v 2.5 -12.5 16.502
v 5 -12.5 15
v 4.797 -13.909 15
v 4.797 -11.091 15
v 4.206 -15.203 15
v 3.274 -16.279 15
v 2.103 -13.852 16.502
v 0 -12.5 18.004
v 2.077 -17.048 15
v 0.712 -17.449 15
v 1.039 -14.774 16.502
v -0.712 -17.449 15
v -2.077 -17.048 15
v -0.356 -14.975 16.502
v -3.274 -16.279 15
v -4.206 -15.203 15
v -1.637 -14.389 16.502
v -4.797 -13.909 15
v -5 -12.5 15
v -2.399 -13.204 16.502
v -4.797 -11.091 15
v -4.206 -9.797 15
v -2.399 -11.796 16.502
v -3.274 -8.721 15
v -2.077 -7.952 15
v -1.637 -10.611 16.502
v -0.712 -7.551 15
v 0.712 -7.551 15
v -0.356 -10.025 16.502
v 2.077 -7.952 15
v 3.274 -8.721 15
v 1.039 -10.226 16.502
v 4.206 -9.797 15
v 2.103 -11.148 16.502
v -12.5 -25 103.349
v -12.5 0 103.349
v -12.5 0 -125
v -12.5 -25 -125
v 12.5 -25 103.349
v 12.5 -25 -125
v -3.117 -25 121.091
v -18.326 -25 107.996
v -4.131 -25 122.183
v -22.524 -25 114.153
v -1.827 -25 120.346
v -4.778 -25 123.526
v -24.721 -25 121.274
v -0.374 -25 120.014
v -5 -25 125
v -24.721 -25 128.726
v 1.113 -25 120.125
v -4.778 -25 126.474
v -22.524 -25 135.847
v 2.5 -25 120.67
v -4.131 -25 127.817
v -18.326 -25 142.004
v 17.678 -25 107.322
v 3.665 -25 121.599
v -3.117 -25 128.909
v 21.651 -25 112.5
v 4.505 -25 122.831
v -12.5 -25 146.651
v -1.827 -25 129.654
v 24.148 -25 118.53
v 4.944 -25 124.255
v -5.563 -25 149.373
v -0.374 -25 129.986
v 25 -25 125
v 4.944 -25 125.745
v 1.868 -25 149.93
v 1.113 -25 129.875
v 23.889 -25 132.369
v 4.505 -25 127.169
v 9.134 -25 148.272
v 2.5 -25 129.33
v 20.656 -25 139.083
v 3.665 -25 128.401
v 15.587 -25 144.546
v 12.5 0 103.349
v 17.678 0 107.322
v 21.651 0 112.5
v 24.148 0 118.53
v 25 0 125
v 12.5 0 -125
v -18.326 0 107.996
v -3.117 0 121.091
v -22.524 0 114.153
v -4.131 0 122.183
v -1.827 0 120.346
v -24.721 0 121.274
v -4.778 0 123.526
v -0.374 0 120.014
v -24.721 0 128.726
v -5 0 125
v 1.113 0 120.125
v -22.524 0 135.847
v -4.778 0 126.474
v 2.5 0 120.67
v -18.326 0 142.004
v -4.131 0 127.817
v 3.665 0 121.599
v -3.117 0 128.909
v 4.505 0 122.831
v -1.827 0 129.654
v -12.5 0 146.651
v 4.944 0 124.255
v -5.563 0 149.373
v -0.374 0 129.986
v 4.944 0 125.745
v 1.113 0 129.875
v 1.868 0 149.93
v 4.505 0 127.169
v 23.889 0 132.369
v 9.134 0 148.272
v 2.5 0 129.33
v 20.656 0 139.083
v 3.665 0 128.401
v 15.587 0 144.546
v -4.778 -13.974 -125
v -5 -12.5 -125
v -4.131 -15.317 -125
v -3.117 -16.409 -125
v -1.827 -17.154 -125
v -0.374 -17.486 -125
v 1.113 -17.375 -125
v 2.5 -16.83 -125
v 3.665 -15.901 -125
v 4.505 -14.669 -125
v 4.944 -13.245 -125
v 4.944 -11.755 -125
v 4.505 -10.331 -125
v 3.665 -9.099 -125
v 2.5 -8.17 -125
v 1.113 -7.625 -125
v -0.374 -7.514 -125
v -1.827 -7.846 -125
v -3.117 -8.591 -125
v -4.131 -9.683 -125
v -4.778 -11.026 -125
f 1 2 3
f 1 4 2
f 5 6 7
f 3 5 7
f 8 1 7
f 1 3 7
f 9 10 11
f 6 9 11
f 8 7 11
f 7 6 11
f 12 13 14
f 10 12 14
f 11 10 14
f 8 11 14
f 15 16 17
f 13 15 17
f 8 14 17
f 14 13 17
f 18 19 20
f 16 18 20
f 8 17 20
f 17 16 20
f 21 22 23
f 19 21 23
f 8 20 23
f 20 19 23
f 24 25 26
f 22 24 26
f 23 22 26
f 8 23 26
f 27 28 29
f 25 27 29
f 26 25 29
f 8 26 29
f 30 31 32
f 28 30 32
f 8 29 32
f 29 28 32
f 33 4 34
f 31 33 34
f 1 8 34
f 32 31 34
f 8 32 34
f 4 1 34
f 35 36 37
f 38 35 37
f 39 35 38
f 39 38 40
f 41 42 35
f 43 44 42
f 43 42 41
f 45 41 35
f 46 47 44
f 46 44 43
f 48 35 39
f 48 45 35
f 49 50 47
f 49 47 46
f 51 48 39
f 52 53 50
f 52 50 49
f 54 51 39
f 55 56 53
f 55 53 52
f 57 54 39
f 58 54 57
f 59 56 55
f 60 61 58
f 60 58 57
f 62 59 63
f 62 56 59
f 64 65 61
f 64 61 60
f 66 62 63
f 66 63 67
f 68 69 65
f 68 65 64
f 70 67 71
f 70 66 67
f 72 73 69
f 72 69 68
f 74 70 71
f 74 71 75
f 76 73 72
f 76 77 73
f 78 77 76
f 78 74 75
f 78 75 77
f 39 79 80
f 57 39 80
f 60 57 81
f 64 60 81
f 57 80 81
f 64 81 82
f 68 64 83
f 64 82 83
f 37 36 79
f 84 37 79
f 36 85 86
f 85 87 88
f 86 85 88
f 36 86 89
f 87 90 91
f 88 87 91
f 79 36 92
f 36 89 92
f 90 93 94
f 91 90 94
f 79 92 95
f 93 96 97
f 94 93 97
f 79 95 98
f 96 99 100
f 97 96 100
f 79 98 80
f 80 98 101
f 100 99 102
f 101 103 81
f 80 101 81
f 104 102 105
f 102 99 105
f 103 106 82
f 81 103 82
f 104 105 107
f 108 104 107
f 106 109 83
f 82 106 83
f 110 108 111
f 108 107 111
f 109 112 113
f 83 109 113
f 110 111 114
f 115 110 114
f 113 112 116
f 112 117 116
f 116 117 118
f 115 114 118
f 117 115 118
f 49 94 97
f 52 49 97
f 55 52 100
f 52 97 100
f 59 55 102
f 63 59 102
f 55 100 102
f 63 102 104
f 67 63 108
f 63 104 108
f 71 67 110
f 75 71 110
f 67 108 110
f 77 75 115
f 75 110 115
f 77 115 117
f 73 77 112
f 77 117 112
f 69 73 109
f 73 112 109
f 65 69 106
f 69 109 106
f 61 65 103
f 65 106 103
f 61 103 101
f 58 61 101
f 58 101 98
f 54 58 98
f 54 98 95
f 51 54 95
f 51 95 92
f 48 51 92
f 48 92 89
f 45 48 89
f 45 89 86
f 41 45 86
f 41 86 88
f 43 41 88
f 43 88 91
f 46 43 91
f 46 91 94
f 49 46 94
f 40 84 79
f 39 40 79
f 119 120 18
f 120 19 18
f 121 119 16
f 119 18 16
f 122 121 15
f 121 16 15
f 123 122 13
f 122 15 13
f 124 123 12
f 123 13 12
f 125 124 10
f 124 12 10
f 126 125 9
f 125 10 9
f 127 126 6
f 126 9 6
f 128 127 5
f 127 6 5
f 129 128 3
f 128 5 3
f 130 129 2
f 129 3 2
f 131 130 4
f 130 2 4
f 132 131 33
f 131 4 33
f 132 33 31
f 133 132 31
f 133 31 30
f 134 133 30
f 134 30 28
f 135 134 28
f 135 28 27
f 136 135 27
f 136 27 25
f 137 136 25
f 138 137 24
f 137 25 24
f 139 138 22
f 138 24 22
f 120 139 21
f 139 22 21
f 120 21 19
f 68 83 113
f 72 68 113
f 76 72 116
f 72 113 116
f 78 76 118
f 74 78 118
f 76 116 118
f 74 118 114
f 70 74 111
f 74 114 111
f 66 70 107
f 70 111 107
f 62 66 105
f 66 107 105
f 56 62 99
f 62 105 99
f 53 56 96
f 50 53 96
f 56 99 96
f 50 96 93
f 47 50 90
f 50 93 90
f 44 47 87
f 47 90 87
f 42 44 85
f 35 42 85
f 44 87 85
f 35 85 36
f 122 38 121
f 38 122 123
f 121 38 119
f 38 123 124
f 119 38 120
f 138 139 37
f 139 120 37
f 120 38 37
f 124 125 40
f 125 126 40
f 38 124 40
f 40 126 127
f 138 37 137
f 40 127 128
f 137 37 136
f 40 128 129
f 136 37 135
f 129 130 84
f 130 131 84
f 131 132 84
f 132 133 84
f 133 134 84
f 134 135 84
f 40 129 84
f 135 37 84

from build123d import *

# Parameters (mm, degrees)
F1_DEPTH = 25
F2_DEPTH = 25
F4_D     = 10
F4_DEPTH = 140
F4_TIP   = 3.0043030951
F6_D     = 10


with BuildPart() as f1:
    # F0 (on Front) → F1 (new body)
    with BuildSketch(Plane.XZ):
        with BuildLine():
            Line((-12.5, 103.3493649054), (-12.5, -125))
            Line((-12.5, -125), (12.5, -125))
            Line((12.5, -125), (12.5, 103.3493649054))
            ThreePointArc((12.5, 103.3493649054), (0, 100), (-12.5, 103.3493649054))
        make_face()
    extrude(amount=F1_DEPTH)

    # F0 (on Front) → F2 (join)
    with BuildSketch(Plane.XZ):
        with BuildLine():
            Line((-12.5, 103.3493649054), (-12.5, -125))
            Line((-12.5, -125), (12.5, -125))
            Line((12.5, -125), (12.5, 103.3493649054))
            ThreePointArc((12.5, 103.3493649054), (0, 100), (-12.5, 103.3493649054))
        make_face()
        with BuildLine():
            ThreePointArc((25, 125), (-12.5, 146.6506350946), (-12.5, 103.3493649054))
            Line((-12.5, 103.3493649054), (-12.5, 125))
            Line((-12.5, 125), (12.5, 125))
            Line((12.5, 125), (12.5, 103.3493649054))
            ThreePointArc((12.5, 103.3493649054), (21.6506350946, 112.5), (25, 125))
        make_face()
        with BuildLine():
            Line((-12.5, 125), (-12.5, 103.3493649054))
            ThreePointArc((-12.5, 103.3493649054), (0, 100), (12.5, 103.3493649054))
            Line((12.5, 103.3493649054), (12.5, 125))
            Line((12.5, 125), (-12.5, 125))
        make_face()
    extrude(amount=F2_DEPTH)

    # F4
    with Locations(Plane(origin=(0, 0, -125), x_dir=(1, 0, 0), z_dir=(0, 0, -1))):
        with Locations((0, 12.5)):
            Hole(F4_D / 2, depth=F4_DEPTH)
            with Locations((0, 0, -(F4_DEPTH + F4_TIP / 2))):  # 118° drill point
                Cone(0, F4_D / 2, F4_TIP, mode=Mode.SUBTRACT)

    # F6 (through all)
    with Locations(Plane.XZ.offset(25)):
        with Locations((0, 125)):
            Hole(F6_D / 2)


solid = f1.part
